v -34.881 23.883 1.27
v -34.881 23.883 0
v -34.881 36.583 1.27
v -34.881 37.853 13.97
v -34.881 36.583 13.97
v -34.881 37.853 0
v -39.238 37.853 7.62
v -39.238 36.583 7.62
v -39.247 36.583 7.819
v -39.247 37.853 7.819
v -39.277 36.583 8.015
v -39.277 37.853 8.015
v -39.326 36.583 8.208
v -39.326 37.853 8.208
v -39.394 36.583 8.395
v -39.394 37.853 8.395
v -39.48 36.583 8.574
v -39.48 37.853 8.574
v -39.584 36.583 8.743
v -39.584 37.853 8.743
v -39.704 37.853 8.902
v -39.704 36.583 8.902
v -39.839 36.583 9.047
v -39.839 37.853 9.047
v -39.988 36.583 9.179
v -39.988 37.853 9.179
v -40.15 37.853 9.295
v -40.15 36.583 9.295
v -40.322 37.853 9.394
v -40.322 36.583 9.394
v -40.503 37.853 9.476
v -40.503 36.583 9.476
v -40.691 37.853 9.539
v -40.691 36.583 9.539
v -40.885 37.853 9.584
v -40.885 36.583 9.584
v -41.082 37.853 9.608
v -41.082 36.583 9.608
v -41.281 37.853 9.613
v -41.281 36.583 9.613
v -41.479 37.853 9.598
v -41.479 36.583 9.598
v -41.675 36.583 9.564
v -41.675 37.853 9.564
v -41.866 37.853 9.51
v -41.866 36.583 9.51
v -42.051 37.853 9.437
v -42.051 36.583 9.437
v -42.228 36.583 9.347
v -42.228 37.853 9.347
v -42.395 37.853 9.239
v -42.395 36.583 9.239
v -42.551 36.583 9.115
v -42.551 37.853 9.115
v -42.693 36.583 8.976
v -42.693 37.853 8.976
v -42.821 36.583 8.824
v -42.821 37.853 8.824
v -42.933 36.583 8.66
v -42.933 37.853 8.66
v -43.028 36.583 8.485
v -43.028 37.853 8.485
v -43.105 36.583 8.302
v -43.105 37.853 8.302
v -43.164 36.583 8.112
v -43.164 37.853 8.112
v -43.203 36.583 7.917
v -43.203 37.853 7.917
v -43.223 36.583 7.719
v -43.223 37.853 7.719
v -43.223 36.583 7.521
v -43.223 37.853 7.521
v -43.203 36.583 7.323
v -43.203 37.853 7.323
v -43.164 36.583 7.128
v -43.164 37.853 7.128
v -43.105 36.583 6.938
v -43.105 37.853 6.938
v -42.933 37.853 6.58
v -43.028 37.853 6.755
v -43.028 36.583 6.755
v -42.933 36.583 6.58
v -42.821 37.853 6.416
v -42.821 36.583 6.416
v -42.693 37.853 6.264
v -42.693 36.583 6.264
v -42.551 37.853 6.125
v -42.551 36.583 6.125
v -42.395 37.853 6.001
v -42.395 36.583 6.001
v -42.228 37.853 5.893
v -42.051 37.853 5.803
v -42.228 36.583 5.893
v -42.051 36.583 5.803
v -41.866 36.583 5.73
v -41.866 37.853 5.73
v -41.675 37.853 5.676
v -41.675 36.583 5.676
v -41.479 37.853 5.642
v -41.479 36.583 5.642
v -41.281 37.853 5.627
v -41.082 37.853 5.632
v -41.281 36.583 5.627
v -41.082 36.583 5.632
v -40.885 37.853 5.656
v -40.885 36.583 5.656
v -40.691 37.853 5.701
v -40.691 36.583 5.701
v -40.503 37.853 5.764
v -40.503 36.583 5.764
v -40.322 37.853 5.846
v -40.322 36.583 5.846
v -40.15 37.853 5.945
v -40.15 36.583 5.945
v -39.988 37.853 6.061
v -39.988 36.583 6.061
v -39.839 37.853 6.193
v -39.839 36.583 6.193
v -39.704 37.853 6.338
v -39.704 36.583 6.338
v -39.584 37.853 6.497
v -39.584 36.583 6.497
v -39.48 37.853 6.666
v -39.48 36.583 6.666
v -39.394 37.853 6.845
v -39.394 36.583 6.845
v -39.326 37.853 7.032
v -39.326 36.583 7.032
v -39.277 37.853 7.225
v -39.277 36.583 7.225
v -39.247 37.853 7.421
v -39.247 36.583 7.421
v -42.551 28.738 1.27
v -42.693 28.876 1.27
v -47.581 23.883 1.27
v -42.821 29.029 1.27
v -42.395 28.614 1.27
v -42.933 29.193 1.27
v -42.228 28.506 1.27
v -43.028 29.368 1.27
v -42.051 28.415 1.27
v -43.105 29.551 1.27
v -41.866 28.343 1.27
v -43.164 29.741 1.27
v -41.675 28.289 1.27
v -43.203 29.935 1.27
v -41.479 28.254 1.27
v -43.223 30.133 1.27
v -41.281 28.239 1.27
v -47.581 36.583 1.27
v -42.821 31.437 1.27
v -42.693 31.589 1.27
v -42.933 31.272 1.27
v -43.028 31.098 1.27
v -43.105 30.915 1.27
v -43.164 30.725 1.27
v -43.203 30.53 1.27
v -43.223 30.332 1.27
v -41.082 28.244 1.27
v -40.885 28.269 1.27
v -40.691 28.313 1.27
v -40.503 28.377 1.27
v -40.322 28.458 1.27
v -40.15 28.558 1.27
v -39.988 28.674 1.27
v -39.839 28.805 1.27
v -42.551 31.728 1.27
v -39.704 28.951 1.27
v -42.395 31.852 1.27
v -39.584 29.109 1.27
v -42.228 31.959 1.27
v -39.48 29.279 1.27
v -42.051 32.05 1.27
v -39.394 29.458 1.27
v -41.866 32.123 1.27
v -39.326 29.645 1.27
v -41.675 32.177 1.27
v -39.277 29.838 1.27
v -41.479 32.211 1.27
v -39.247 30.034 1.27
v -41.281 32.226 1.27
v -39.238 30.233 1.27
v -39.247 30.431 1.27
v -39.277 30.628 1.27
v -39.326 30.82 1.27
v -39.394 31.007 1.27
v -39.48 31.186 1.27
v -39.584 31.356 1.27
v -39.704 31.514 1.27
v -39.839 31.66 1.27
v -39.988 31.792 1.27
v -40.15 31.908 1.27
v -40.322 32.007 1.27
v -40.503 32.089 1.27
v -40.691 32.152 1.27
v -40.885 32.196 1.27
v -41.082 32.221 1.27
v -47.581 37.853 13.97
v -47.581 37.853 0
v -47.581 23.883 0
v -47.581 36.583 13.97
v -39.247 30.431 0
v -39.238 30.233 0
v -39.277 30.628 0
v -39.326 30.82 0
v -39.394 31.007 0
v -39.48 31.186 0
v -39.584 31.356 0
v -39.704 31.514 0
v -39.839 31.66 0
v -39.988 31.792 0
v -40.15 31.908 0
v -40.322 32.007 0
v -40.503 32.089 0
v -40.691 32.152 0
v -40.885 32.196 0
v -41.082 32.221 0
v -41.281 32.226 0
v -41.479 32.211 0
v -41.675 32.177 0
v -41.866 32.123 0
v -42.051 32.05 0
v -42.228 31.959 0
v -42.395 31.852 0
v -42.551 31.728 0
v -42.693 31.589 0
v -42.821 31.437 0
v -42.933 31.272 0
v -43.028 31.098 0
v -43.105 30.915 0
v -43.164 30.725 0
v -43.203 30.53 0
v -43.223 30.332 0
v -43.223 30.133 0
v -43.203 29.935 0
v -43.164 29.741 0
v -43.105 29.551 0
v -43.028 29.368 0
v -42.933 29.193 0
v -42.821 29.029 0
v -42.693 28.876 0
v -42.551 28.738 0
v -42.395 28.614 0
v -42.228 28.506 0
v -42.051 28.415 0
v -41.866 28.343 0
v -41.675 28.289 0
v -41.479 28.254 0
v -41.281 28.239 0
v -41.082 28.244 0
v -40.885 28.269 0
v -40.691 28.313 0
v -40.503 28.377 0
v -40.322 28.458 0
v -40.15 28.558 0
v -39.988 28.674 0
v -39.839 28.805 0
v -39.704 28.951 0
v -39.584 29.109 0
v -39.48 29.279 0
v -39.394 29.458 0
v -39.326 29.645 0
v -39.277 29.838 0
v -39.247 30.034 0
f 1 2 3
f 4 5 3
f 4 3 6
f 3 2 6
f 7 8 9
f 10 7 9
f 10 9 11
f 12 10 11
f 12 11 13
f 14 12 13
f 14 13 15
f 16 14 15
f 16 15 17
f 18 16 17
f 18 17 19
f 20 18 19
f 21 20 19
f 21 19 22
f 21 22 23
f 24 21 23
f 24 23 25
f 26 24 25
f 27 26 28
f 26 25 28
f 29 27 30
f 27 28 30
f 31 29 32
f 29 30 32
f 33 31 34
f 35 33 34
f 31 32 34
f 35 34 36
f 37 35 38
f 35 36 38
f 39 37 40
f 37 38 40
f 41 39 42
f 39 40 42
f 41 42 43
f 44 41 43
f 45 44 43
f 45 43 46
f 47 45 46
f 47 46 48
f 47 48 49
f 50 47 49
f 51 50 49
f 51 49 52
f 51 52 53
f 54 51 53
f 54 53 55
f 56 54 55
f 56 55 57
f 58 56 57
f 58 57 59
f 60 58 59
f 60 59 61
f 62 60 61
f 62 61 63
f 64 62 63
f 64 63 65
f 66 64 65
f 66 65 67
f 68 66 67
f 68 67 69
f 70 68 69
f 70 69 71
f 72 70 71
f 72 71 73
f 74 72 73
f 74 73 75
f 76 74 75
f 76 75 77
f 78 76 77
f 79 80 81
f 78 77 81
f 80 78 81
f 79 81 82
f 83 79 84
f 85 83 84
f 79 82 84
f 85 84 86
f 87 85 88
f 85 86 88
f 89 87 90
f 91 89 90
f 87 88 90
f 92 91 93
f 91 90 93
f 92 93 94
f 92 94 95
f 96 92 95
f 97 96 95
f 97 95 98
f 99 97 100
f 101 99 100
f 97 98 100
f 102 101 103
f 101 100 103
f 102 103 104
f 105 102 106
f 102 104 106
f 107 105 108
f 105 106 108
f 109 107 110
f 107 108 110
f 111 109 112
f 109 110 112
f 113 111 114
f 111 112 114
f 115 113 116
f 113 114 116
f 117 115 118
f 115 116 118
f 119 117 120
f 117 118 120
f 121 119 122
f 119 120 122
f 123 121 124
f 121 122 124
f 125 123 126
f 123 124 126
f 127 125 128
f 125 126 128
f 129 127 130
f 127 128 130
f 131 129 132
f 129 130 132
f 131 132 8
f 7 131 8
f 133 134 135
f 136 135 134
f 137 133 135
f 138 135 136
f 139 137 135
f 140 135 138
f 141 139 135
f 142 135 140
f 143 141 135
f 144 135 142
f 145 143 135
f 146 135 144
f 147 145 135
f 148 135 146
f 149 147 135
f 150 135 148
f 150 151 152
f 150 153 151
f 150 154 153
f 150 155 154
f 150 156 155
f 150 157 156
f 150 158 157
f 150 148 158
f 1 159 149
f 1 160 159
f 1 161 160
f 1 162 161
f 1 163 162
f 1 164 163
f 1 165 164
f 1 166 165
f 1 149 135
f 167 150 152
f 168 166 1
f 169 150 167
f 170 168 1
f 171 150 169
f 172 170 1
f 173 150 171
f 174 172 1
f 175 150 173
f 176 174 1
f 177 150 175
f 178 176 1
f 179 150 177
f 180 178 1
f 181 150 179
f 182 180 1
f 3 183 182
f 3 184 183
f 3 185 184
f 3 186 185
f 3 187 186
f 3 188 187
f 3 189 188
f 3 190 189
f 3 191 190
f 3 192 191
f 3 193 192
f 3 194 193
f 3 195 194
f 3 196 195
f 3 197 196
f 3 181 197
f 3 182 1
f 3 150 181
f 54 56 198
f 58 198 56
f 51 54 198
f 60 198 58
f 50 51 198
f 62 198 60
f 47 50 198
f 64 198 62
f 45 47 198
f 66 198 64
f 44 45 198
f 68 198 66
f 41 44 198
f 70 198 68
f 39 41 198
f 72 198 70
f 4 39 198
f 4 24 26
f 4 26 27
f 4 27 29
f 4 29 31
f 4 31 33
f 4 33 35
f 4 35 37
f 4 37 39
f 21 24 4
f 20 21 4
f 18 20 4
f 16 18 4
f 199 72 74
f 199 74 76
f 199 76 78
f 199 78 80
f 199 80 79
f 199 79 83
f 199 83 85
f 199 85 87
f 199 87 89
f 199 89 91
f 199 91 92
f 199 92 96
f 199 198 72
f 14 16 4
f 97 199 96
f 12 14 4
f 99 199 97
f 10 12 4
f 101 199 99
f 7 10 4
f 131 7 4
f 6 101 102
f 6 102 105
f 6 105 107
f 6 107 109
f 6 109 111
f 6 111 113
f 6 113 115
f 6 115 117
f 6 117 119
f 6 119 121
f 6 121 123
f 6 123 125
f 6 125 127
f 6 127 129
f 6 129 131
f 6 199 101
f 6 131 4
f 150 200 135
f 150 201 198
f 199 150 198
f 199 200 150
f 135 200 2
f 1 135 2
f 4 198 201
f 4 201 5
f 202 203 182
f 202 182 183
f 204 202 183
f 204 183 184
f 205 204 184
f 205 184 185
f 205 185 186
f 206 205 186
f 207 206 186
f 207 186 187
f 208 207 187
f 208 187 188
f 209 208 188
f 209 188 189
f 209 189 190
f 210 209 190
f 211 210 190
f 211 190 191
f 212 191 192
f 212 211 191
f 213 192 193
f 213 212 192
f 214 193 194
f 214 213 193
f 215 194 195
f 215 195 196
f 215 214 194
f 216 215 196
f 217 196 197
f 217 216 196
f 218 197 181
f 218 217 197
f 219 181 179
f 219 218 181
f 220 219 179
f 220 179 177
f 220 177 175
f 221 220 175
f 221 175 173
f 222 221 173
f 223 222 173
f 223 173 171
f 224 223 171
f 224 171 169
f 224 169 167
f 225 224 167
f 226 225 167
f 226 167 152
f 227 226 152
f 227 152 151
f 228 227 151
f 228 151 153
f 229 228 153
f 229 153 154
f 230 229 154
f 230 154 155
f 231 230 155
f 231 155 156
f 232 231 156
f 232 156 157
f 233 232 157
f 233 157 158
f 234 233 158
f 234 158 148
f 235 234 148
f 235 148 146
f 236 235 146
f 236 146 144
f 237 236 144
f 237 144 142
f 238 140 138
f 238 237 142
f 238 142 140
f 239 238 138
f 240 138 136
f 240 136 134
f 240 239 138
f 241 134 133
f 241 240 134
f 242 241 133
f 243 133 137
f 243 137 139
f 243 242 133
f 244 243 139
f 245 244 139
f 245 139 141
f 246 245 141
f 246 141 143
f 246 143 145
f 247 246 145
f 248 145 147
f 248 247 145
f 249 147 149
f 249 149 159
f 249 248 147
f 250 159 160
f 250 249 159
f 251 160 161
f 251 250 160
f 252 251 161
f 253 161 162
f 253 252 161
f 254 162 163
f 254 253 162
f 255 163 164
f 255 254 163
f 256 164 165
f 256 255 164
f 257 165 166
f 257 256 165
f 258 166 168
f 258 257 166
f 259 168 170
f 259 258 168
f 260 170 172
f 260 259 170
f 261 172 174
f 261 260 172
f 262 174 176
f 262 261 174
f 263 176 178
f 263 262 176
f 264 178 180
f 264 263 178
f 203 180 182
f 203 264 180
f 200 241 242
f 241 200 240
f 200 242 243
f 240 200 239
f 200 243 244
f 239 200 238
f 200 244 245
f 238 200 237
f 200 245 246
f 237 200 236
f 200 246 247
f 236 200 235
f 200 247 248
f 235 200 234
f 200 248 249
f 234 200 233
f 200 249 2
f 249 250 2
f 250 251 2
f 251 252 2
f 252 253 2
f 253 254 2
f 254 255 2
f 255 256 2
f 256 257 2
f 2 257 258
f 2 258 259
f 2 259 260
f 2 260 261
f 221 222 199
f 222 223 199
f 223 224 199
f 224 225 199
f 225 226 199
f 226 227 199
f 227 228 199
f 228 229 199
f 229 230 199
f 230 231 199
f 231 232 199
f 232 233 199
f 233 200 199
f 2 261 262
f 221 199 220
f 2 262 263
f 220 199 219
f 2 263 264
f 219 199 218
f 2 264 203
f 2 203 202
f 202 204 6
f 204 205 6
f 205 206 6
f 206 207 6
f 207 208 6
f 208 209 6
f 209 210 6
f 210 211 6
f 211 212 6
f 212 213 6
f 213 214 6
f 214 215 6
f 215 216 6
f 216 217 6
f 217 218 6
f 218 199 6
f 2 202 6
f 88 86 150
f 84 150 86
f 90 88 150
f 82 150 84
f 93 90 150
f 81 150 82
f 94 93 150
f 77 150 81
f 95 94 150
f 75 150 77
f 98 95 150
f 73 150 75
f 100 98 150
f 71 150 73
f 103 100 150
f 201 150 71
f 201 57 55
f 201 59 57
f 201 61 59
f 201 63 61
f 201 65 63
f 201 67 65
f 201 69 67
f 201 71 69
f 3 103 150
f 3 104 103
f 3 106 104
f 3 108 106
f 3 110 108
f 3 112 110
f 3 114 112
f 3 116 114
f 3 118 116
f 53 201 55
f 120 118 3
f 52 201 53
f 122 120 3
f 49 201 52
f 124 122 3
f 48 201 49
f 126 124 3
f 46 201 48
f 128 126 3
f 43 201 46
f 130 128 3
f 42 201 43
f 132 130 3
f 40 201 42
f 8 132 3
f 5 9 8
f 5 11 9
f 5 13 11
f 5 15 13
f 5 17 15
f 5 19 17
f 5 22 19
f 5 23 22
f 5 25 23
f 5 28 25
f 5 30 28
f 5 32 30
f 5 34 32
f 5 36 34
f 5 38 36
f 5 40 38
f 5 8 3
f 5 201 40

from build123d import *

# Parameters (mm, degrees)
F0_W     = 12.7
F0_H     = 13.97
F0_R     = 1.9939
F1_DEPTH = 13.97
F2_W     = 12.7
F2_H     = 12.7
F2_R     = 1.9939
F3_DEPTH = 12.7
F4_R     = 1.9939
F5_DEPTH = 25.4


with BuildPart() as f1:
    # F0 (on Top) → F1 (new body)
    with BuildSketch(Plane.XY):
        with Locations((-41.231433, 30.867646)):
            Rectangle(F0_W, F0_H)
        with Locations((-41.231433, 30.232646)):
            Circle(F0_R, mode=Mode.SUBTRACT)
    extrude(amount=F1_DEPTH)

    # F2 (on face) → F3 (cut)
    with BuildSketch(Plane.XY.offset(13.97)):
        with Locations((-41.231433, 30.232646)):
            Rectangle(F2_W, F2_H)
        with Locations((-41.231433, 30.232646)):
            Circle(F2_R, mode=Mode.SUBTRACT)
    extrude(amount=-F3_DEPTH, mode=Mode.SUBTRACT)

    # F4 (on face) → F5 (cut)
    with BuildSketch(Plane.XZ.offset(-36.582646)):
        with Locations((-41.231433, 7.62)):
            Circle(F4_R)
    extrude(amount=-F5_DEPTH, mode=Mode.SUBTRACT)


solid = f1.part
